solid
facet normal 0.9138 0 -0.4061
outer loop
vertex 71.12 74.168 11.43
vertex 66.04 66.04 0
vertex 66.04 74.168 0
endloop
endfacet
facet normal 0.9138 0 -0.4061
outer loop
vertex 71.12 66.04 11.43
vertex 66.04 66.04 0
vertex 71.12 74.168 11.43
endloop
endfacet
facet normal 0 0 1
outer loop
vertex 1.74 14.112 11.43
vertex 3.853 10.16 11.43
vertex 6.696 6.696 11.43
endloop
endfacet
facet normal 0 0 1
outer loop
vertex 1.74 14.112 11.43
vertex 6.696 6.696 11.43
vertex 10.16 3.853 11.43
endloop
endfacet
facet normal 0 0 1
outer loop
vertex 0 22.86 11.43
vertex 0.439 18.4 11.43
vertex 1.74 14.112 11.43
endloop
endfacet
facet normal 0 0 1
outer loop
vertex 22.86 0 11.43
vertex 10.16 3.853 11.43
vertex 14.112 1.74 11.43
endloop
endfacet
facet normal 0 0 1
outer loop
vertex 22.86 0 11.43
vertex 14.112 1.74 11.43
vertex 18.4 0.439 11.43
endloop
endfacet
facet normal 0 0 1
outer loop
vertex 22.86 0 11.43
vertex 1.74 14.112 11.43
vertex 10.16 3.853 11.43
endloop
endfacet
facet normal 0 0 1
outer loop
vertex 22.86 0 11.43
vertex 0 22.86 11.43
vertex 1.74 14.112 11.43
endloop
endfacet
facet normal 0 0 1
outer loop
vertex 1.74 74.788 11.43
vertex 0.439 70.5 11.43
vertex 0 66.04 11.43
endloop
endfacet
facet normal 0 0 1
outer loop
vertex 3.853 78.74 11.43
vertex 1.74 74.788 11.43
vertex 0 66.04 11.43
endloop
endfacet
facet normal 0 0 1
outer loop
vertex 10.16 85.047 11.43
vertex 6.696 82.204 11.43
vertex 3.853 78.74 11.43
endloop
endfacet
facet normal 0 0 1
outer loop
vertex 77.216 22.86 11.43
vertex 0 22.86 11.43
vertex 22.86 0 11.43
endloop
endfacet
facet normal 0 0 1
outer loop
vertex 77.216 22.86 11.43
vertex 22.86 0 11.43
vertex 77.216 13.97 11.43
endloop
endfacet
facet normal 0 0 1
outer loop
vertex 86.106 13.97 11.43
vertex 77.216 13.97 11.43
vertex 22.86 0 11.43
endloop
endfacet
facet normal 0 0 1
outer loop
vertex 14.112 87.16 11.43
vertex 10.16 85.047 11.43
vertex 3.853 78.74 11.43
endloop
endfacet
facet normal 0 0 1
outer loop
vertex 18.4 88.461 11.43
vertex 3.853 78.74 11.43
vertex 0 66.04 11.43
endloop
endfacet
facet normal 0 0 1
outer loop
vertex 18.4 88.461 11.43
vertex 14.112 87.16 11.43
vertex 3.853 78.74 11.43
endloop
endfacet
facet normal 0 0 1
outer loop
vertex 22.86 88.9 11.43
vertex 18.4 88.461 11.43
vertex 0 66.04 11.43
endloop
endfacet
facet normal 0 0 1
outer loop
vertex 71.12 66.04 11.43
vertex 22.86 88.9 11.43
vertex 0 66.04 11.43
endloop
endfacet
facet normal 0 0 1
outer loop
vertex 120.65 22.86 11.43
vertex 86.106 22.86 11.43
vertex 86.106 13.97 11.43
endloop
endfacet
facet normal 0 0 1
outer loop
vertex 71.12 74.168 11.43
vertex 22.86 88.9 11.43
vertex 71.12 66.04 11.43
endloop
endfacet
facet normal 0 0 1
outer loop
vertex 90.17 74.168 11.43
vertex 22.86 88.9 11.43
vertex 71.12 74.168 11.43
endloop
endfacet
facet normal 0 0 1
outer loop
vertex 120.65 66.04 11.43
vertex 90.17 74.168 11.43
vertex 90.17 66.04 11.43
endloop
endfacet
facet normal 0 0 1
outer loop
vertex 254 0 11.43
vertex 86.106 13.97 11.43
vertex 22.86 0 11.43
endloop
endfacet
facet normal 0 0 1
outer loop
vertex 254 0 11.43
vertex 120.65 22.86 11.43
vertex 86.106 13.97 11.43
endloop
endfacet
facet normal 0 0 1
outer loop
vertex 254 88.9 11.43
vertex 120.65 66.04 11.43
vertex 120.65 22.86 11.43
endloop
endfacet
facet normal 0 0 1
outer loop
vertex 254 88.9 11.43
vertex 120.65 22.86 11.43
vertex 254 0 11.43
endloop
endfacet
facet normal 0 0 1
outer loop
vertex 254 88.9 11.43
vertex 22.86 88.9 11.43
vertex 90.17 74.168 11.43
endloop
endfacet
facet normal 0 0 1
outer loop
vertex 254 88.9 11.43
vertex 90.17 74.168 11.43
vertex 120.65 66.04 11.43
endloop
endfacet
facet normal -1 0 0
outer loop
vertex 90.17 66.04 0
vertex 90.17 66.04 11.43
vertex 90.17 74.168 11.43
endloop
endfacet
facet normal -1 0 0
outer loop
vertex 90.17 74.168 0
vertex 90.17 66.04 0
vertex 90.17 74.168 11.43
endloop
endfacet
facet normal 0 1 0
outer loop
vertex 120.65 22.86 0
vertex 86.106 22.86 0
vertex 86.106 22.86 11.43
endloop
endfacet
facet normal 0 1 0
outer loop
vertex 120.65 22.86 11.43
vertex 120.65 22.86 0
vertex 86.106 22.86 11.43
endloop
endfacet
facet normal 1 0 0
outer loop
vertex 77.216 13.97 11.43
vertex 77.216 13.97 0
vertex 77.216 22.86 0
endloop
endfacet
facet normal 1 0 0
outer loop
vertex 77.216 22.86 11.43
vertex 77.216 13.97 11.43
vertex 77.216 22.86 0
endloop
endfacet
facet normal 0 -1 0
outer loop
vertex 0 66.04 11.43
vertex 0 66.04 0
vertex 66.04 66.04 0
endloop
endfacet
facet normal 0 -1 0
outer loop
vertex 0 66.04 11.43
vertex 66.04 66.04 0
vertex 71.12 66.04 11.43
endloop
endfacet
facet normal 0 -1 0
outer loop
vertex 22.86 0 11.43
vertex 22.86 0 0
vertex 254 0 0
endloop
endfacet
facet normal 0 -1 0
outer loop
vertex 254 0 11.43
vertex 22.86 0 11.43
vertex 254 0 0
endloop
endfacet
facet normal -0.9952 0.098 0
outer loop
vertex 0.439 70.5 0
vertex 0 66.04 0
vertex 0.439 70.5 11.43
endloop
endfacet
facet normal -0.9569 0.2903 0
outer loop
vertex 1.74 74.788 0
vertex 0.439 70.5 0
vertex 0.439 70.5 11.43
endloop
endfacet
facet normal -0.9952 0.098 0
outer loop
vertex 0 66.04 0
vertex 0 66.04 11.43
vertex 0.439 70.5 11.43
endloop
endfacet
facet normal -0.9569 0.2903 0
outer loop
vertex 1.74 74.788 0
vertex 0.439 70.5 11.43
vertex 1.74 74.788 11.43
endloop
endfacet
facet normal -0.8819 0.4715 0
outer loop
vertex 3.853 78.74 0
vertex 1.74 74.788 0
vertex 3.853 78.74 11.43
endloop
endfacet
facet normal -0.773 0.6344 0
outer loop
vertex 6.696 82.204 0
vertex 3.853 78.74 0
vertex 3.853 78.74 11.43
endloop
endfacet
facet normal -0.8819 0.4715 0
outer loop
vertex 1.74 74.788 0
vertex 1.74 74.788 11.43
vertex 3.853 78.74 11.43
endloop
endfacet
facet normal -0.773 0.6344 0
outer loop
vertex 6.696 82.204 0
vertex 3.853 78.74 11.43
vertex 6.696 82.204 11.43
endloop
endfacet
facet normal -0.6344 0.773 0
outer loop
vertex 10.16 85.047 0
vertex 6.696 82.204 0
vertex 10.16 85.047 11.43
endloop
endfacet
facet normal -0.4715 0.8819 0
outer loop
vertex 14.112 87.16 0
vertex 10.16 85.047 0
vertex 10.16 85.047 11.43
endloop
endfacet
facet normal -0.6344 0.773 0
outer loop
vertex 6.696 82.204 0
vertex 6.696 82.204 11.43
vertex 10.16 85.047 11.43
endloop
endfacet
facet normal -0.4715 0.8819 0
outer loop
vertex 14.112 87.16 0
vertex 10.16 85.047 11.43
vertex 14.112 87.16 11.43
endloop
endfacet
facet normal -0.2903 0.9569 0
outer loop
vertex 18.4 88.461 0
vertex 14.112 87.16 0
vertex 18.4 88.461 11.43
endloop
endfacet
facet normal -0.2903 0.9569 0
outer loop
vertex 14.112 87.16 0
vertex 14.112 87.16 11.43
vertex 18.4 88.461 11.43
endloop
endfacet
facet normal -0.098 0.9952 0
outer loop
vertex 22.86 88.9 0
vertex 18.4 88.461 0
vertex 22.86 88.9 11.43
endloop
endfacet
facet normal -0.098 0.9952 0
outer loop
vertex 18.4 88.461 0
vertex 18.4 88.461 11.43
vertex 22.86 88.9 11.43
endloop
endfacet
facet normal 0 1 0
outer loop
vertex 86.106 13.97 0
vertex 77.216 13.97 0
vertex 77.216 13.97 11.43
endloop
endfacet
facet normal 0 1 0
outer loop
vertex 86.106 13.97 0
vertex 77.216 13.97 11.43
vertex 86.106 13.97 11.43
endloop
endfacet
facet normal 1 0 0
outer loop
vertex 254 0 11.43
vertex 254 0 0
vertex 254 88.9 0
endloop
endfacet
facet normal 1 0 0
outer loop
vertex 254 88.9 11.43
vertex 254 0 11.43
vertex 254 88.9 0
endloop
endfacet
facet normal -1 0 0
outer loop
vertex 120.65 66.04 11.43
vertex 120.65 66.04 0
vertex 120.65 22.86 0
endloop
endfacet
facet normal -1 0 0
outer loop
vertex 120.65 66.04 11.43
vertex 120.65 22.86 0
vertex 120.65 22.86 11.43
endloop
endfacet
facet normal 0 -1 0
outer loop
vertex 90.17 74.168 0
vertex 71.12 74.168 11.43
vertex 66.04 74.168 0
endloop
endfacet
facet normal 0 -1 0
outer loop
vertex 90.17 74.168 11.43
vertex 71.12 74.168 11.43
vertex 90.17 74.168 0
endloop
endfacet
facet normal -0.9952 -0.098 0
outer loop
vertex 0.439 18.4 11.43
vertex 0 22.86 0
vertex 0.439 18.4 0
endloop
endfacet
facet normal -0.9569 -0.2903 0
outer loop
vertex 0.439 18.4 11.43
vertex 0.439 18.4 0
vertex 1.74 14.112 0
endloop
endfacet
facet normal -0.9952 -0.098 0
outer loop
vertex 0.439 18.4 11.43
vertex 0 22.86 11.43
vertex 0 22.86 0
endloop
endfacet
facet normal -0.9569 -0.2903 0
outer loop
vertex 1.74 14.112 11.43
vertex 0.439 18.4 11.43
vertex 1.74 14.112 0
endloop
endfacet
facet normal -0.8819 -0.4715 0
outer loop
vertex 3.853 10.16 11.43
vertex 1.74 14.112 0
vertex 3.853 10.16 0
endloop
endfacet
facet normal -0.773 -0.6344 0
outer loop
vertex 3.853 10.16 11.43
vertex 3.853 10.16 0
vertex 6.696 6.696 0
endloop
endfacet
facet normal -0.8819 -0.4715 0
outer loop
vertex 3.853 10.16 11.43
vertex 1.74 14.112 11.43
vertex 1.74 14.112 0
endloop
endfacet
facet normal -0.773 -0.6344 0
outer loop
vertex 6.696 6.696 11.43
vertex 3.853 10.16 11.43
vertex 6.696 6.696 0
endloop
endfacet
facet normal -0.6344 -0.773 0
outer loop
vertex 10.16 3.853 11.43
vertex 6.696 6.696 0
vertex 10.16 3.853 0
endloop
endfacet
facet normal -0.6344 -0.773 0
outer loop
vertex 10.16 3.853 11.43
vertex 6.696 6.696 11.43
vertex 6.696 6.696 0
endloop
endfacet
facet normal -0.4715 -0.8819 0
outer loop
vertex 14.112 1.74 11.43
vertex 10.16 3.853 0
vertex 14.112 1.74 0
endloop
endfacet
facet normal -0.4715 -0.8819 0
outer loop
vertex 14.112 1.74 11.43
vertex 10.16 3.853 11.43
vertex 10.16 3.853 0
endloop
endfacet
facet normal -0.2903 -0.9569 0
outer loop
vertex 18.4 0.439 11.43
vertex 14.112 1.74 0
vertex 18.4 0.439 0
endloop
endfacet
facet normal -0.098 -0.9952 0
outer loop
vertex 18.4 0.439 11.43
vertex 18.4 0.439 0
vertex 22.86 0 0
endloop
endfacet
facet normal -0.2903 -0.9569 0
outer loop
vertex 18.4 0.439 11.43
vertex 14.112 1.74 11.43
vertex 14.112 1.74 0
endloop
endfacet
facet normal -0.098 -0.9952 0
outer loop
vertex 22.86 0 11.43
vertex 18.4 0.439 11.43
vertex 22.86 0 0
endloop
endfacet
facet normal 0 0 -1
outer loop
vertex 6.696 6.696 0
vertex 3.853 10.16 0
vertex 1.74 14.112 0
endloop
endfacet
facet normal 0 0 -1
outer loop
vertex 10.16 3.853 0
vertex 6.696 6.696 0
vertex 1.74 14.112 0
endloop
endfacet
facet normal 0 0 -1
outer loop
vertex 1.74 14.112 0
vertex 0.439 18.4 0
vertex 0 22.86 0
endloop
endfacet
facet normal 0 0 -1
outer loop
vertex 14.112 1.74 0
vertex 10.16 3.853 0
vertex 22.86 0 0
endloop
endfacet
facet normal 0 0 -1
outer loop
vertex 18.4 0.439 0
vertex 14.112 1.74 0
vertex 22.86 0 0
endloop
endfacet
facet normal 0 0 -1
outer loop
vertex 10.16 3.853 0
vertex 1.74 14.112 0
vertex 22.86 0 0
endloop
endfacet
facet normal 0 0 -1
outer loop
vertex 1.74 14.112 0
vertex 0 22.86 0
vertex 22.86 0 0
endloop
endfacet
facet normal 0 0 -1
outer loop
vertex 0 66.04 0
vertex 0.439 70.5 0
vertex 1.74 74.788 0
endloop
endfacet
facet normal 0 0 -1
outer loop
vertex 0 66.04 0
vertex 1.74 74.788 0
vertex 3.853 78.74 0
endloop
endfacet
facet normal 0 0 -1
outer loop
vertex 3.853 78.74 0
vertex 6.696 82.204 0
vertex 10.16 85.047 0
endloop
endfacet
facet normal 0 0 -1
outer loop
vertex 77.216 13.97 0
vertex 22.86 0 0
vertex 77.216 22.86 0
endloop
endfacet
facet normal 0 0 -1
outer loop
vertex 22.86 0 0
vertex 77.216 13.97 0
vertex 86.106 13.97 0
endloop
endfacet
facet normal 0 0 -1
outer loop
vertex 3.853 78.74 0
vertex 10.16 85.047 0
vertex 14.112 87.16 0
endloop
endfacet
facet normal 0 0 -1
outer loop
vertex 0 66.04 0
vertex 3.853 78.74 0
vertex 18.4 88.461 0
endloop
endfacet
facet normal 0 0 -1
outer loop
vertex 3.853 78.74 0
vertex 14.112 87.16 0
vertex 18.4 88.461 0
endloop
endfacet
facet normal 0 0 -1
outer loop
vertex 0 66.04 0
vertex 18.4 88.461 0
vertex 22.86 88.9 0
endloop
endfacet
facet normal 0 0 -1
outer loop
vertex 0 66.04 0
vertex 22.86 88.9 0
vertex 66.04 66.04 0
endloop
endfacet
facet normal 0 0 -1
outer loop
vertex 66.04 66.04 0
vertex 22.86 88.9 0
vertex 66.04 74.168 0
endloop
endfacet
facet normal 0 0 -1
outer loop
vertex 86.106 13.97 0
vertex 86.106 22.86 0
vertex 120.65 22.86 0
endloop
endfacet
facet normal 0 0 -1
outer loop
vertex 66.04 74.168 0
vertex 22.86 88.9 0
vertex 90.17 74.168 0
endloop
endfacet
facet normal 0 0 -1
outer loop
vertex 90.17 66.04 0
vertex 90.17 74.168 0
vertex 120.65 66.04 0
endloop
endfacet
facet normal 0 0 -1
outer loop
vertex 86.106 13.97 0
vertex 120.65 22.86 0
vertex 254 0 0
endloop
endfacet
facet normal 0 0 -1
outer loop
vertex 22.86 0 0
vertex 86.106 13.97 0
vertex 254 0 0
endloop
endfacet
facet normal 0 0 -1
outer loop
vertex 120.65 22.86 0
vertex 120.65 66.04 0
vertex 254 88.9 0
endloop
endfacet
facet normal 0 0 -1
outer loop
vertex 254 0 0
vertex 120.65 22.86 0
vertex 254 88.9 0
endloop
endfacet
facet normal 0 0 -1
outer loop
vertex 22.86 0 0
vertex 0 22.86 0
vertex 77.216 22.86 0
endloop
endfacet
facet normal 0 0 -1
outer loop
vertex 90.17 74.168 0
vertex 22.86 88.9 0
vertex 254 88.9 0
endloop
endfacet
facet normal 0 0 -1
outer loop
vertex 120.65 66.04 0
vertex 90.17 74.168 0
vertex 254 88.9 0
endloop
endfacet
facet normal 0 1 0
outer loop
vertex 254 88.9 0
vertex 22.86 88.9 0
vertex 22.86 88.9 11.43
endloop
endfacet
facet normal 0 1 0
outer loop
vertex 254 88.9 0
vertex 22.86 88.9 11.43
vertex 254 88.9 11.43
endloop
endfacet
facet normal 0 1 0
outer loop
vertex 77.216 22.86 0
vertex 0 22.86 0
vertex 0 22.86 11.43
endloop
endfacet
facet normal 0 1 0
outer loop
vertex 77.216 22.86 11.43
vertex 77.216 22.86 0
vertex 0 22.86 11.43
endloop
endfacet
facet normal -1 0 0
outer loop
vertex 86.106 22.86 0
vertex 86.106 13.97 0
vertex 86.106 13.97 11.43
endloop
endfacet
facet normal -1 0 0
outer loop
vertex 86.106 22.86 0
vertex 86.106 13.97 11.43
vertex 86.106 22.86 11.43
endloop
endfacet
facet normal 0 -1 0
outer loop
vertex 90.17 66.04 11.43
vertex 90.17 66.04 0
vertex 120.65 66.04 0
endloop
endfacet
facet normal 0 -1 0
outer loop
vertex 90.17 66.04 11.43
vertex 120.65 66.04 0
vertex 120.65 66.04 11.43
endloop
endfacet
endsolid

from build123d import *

# Parameters (mm, degrees)
SKETCH1_W           = 254
SKETCH1_H           = 88.9
BOSS_EXTRUDE1_DEPTH = 11.43
FILLET1_R           = 22.86
FILLET2_R           = 22.86
SKETCH2_W           = 11.43
SKETCH2_H           = 43.18
CUT_EXTRUDE1_DEPTH  = 120.65
SKETCH3_W           = 8.89
SKETCH3_H           = 8.89
CUT_EXTRUDE2_DEPTH  = 11.43
SKETCH4_W           = 19.05
SKETCH4_H           = 8.128
CUT_EXTRUDE3_DEPTH  = 11.43
CUT_EXTRUDE4_DEPTH  = 8.128


with BuildPart() as part:
    # Sketch1 → Boss-Extrude1 (new body)
    with BuildSketch(Plane.XY):
        with Locations((127, 44.45)):
            Rectangle(SKETCH1_W, SKETCH1_H)
    extrude(amount=BOSS_EXTRUDE1_DEPTH)

    # Fillet1
    fillet1_edges = [part.edges().sort_by_distance(p)[0] for p in [
        (0, 88.9, 5.715),
    ]]
    fillet(fillet1_edges, radius=FILLET1_R)

    # Fillet2
    fillet2_edges = [part.edges().sort_by_distance(p)[0] for p in [
        (0, 0, 5.715),
    ]]
    fillet(fillet2_edges, radius=FILLET2_R)

    # Sketch2 → Cut-Extrude1 (cut)
    with BuildSketch(Plane.ZY):
        with Locations((5.715, 44.45)):
            Rectangle(SKETCH2_W, SKETCH2_H)
    extrude(amount=-CUT_EXTRUDE1_DEPTH, mode=Mode.SUBTRACT)

    # Sketch3 → Cut-Extrude2 (cut)
    with BuildSketch(Plane.XY.offset(11.43)):
        with Locations((81.661, 18.415)):
            Rectangle(SKETCH3_W, SKETCH3_H)
    extrude(amount=-CUT_EXTRUDE2_DEPTH, mode=Mode.SUBTRACT)

    # Sketch4 → Cut-Extrude3 (cut)
    with BuildSketch(Plane.XY.offset(11.43)):
        with Locations((80.645, 70.104)):
            Rectangle(SKETCH4_W, SKETCH4_H)
    extrude(amount=-CUT_EXTRUDE3_DEPTH, mode=Mode.SUBTRACT)

    # Sketch6 → Cut-Extrude4 (cut)
    with BuildSketch(Plane.XZ.offset(-66.04)):
        Polygon((66.04, 0), (71.12, 11.43), (71.12, 0), align=None)
    extrude(amount=-CUT_EXTRUDE4_DEPTH, mode=Mode.SUBTRACT)


solid = part.part
